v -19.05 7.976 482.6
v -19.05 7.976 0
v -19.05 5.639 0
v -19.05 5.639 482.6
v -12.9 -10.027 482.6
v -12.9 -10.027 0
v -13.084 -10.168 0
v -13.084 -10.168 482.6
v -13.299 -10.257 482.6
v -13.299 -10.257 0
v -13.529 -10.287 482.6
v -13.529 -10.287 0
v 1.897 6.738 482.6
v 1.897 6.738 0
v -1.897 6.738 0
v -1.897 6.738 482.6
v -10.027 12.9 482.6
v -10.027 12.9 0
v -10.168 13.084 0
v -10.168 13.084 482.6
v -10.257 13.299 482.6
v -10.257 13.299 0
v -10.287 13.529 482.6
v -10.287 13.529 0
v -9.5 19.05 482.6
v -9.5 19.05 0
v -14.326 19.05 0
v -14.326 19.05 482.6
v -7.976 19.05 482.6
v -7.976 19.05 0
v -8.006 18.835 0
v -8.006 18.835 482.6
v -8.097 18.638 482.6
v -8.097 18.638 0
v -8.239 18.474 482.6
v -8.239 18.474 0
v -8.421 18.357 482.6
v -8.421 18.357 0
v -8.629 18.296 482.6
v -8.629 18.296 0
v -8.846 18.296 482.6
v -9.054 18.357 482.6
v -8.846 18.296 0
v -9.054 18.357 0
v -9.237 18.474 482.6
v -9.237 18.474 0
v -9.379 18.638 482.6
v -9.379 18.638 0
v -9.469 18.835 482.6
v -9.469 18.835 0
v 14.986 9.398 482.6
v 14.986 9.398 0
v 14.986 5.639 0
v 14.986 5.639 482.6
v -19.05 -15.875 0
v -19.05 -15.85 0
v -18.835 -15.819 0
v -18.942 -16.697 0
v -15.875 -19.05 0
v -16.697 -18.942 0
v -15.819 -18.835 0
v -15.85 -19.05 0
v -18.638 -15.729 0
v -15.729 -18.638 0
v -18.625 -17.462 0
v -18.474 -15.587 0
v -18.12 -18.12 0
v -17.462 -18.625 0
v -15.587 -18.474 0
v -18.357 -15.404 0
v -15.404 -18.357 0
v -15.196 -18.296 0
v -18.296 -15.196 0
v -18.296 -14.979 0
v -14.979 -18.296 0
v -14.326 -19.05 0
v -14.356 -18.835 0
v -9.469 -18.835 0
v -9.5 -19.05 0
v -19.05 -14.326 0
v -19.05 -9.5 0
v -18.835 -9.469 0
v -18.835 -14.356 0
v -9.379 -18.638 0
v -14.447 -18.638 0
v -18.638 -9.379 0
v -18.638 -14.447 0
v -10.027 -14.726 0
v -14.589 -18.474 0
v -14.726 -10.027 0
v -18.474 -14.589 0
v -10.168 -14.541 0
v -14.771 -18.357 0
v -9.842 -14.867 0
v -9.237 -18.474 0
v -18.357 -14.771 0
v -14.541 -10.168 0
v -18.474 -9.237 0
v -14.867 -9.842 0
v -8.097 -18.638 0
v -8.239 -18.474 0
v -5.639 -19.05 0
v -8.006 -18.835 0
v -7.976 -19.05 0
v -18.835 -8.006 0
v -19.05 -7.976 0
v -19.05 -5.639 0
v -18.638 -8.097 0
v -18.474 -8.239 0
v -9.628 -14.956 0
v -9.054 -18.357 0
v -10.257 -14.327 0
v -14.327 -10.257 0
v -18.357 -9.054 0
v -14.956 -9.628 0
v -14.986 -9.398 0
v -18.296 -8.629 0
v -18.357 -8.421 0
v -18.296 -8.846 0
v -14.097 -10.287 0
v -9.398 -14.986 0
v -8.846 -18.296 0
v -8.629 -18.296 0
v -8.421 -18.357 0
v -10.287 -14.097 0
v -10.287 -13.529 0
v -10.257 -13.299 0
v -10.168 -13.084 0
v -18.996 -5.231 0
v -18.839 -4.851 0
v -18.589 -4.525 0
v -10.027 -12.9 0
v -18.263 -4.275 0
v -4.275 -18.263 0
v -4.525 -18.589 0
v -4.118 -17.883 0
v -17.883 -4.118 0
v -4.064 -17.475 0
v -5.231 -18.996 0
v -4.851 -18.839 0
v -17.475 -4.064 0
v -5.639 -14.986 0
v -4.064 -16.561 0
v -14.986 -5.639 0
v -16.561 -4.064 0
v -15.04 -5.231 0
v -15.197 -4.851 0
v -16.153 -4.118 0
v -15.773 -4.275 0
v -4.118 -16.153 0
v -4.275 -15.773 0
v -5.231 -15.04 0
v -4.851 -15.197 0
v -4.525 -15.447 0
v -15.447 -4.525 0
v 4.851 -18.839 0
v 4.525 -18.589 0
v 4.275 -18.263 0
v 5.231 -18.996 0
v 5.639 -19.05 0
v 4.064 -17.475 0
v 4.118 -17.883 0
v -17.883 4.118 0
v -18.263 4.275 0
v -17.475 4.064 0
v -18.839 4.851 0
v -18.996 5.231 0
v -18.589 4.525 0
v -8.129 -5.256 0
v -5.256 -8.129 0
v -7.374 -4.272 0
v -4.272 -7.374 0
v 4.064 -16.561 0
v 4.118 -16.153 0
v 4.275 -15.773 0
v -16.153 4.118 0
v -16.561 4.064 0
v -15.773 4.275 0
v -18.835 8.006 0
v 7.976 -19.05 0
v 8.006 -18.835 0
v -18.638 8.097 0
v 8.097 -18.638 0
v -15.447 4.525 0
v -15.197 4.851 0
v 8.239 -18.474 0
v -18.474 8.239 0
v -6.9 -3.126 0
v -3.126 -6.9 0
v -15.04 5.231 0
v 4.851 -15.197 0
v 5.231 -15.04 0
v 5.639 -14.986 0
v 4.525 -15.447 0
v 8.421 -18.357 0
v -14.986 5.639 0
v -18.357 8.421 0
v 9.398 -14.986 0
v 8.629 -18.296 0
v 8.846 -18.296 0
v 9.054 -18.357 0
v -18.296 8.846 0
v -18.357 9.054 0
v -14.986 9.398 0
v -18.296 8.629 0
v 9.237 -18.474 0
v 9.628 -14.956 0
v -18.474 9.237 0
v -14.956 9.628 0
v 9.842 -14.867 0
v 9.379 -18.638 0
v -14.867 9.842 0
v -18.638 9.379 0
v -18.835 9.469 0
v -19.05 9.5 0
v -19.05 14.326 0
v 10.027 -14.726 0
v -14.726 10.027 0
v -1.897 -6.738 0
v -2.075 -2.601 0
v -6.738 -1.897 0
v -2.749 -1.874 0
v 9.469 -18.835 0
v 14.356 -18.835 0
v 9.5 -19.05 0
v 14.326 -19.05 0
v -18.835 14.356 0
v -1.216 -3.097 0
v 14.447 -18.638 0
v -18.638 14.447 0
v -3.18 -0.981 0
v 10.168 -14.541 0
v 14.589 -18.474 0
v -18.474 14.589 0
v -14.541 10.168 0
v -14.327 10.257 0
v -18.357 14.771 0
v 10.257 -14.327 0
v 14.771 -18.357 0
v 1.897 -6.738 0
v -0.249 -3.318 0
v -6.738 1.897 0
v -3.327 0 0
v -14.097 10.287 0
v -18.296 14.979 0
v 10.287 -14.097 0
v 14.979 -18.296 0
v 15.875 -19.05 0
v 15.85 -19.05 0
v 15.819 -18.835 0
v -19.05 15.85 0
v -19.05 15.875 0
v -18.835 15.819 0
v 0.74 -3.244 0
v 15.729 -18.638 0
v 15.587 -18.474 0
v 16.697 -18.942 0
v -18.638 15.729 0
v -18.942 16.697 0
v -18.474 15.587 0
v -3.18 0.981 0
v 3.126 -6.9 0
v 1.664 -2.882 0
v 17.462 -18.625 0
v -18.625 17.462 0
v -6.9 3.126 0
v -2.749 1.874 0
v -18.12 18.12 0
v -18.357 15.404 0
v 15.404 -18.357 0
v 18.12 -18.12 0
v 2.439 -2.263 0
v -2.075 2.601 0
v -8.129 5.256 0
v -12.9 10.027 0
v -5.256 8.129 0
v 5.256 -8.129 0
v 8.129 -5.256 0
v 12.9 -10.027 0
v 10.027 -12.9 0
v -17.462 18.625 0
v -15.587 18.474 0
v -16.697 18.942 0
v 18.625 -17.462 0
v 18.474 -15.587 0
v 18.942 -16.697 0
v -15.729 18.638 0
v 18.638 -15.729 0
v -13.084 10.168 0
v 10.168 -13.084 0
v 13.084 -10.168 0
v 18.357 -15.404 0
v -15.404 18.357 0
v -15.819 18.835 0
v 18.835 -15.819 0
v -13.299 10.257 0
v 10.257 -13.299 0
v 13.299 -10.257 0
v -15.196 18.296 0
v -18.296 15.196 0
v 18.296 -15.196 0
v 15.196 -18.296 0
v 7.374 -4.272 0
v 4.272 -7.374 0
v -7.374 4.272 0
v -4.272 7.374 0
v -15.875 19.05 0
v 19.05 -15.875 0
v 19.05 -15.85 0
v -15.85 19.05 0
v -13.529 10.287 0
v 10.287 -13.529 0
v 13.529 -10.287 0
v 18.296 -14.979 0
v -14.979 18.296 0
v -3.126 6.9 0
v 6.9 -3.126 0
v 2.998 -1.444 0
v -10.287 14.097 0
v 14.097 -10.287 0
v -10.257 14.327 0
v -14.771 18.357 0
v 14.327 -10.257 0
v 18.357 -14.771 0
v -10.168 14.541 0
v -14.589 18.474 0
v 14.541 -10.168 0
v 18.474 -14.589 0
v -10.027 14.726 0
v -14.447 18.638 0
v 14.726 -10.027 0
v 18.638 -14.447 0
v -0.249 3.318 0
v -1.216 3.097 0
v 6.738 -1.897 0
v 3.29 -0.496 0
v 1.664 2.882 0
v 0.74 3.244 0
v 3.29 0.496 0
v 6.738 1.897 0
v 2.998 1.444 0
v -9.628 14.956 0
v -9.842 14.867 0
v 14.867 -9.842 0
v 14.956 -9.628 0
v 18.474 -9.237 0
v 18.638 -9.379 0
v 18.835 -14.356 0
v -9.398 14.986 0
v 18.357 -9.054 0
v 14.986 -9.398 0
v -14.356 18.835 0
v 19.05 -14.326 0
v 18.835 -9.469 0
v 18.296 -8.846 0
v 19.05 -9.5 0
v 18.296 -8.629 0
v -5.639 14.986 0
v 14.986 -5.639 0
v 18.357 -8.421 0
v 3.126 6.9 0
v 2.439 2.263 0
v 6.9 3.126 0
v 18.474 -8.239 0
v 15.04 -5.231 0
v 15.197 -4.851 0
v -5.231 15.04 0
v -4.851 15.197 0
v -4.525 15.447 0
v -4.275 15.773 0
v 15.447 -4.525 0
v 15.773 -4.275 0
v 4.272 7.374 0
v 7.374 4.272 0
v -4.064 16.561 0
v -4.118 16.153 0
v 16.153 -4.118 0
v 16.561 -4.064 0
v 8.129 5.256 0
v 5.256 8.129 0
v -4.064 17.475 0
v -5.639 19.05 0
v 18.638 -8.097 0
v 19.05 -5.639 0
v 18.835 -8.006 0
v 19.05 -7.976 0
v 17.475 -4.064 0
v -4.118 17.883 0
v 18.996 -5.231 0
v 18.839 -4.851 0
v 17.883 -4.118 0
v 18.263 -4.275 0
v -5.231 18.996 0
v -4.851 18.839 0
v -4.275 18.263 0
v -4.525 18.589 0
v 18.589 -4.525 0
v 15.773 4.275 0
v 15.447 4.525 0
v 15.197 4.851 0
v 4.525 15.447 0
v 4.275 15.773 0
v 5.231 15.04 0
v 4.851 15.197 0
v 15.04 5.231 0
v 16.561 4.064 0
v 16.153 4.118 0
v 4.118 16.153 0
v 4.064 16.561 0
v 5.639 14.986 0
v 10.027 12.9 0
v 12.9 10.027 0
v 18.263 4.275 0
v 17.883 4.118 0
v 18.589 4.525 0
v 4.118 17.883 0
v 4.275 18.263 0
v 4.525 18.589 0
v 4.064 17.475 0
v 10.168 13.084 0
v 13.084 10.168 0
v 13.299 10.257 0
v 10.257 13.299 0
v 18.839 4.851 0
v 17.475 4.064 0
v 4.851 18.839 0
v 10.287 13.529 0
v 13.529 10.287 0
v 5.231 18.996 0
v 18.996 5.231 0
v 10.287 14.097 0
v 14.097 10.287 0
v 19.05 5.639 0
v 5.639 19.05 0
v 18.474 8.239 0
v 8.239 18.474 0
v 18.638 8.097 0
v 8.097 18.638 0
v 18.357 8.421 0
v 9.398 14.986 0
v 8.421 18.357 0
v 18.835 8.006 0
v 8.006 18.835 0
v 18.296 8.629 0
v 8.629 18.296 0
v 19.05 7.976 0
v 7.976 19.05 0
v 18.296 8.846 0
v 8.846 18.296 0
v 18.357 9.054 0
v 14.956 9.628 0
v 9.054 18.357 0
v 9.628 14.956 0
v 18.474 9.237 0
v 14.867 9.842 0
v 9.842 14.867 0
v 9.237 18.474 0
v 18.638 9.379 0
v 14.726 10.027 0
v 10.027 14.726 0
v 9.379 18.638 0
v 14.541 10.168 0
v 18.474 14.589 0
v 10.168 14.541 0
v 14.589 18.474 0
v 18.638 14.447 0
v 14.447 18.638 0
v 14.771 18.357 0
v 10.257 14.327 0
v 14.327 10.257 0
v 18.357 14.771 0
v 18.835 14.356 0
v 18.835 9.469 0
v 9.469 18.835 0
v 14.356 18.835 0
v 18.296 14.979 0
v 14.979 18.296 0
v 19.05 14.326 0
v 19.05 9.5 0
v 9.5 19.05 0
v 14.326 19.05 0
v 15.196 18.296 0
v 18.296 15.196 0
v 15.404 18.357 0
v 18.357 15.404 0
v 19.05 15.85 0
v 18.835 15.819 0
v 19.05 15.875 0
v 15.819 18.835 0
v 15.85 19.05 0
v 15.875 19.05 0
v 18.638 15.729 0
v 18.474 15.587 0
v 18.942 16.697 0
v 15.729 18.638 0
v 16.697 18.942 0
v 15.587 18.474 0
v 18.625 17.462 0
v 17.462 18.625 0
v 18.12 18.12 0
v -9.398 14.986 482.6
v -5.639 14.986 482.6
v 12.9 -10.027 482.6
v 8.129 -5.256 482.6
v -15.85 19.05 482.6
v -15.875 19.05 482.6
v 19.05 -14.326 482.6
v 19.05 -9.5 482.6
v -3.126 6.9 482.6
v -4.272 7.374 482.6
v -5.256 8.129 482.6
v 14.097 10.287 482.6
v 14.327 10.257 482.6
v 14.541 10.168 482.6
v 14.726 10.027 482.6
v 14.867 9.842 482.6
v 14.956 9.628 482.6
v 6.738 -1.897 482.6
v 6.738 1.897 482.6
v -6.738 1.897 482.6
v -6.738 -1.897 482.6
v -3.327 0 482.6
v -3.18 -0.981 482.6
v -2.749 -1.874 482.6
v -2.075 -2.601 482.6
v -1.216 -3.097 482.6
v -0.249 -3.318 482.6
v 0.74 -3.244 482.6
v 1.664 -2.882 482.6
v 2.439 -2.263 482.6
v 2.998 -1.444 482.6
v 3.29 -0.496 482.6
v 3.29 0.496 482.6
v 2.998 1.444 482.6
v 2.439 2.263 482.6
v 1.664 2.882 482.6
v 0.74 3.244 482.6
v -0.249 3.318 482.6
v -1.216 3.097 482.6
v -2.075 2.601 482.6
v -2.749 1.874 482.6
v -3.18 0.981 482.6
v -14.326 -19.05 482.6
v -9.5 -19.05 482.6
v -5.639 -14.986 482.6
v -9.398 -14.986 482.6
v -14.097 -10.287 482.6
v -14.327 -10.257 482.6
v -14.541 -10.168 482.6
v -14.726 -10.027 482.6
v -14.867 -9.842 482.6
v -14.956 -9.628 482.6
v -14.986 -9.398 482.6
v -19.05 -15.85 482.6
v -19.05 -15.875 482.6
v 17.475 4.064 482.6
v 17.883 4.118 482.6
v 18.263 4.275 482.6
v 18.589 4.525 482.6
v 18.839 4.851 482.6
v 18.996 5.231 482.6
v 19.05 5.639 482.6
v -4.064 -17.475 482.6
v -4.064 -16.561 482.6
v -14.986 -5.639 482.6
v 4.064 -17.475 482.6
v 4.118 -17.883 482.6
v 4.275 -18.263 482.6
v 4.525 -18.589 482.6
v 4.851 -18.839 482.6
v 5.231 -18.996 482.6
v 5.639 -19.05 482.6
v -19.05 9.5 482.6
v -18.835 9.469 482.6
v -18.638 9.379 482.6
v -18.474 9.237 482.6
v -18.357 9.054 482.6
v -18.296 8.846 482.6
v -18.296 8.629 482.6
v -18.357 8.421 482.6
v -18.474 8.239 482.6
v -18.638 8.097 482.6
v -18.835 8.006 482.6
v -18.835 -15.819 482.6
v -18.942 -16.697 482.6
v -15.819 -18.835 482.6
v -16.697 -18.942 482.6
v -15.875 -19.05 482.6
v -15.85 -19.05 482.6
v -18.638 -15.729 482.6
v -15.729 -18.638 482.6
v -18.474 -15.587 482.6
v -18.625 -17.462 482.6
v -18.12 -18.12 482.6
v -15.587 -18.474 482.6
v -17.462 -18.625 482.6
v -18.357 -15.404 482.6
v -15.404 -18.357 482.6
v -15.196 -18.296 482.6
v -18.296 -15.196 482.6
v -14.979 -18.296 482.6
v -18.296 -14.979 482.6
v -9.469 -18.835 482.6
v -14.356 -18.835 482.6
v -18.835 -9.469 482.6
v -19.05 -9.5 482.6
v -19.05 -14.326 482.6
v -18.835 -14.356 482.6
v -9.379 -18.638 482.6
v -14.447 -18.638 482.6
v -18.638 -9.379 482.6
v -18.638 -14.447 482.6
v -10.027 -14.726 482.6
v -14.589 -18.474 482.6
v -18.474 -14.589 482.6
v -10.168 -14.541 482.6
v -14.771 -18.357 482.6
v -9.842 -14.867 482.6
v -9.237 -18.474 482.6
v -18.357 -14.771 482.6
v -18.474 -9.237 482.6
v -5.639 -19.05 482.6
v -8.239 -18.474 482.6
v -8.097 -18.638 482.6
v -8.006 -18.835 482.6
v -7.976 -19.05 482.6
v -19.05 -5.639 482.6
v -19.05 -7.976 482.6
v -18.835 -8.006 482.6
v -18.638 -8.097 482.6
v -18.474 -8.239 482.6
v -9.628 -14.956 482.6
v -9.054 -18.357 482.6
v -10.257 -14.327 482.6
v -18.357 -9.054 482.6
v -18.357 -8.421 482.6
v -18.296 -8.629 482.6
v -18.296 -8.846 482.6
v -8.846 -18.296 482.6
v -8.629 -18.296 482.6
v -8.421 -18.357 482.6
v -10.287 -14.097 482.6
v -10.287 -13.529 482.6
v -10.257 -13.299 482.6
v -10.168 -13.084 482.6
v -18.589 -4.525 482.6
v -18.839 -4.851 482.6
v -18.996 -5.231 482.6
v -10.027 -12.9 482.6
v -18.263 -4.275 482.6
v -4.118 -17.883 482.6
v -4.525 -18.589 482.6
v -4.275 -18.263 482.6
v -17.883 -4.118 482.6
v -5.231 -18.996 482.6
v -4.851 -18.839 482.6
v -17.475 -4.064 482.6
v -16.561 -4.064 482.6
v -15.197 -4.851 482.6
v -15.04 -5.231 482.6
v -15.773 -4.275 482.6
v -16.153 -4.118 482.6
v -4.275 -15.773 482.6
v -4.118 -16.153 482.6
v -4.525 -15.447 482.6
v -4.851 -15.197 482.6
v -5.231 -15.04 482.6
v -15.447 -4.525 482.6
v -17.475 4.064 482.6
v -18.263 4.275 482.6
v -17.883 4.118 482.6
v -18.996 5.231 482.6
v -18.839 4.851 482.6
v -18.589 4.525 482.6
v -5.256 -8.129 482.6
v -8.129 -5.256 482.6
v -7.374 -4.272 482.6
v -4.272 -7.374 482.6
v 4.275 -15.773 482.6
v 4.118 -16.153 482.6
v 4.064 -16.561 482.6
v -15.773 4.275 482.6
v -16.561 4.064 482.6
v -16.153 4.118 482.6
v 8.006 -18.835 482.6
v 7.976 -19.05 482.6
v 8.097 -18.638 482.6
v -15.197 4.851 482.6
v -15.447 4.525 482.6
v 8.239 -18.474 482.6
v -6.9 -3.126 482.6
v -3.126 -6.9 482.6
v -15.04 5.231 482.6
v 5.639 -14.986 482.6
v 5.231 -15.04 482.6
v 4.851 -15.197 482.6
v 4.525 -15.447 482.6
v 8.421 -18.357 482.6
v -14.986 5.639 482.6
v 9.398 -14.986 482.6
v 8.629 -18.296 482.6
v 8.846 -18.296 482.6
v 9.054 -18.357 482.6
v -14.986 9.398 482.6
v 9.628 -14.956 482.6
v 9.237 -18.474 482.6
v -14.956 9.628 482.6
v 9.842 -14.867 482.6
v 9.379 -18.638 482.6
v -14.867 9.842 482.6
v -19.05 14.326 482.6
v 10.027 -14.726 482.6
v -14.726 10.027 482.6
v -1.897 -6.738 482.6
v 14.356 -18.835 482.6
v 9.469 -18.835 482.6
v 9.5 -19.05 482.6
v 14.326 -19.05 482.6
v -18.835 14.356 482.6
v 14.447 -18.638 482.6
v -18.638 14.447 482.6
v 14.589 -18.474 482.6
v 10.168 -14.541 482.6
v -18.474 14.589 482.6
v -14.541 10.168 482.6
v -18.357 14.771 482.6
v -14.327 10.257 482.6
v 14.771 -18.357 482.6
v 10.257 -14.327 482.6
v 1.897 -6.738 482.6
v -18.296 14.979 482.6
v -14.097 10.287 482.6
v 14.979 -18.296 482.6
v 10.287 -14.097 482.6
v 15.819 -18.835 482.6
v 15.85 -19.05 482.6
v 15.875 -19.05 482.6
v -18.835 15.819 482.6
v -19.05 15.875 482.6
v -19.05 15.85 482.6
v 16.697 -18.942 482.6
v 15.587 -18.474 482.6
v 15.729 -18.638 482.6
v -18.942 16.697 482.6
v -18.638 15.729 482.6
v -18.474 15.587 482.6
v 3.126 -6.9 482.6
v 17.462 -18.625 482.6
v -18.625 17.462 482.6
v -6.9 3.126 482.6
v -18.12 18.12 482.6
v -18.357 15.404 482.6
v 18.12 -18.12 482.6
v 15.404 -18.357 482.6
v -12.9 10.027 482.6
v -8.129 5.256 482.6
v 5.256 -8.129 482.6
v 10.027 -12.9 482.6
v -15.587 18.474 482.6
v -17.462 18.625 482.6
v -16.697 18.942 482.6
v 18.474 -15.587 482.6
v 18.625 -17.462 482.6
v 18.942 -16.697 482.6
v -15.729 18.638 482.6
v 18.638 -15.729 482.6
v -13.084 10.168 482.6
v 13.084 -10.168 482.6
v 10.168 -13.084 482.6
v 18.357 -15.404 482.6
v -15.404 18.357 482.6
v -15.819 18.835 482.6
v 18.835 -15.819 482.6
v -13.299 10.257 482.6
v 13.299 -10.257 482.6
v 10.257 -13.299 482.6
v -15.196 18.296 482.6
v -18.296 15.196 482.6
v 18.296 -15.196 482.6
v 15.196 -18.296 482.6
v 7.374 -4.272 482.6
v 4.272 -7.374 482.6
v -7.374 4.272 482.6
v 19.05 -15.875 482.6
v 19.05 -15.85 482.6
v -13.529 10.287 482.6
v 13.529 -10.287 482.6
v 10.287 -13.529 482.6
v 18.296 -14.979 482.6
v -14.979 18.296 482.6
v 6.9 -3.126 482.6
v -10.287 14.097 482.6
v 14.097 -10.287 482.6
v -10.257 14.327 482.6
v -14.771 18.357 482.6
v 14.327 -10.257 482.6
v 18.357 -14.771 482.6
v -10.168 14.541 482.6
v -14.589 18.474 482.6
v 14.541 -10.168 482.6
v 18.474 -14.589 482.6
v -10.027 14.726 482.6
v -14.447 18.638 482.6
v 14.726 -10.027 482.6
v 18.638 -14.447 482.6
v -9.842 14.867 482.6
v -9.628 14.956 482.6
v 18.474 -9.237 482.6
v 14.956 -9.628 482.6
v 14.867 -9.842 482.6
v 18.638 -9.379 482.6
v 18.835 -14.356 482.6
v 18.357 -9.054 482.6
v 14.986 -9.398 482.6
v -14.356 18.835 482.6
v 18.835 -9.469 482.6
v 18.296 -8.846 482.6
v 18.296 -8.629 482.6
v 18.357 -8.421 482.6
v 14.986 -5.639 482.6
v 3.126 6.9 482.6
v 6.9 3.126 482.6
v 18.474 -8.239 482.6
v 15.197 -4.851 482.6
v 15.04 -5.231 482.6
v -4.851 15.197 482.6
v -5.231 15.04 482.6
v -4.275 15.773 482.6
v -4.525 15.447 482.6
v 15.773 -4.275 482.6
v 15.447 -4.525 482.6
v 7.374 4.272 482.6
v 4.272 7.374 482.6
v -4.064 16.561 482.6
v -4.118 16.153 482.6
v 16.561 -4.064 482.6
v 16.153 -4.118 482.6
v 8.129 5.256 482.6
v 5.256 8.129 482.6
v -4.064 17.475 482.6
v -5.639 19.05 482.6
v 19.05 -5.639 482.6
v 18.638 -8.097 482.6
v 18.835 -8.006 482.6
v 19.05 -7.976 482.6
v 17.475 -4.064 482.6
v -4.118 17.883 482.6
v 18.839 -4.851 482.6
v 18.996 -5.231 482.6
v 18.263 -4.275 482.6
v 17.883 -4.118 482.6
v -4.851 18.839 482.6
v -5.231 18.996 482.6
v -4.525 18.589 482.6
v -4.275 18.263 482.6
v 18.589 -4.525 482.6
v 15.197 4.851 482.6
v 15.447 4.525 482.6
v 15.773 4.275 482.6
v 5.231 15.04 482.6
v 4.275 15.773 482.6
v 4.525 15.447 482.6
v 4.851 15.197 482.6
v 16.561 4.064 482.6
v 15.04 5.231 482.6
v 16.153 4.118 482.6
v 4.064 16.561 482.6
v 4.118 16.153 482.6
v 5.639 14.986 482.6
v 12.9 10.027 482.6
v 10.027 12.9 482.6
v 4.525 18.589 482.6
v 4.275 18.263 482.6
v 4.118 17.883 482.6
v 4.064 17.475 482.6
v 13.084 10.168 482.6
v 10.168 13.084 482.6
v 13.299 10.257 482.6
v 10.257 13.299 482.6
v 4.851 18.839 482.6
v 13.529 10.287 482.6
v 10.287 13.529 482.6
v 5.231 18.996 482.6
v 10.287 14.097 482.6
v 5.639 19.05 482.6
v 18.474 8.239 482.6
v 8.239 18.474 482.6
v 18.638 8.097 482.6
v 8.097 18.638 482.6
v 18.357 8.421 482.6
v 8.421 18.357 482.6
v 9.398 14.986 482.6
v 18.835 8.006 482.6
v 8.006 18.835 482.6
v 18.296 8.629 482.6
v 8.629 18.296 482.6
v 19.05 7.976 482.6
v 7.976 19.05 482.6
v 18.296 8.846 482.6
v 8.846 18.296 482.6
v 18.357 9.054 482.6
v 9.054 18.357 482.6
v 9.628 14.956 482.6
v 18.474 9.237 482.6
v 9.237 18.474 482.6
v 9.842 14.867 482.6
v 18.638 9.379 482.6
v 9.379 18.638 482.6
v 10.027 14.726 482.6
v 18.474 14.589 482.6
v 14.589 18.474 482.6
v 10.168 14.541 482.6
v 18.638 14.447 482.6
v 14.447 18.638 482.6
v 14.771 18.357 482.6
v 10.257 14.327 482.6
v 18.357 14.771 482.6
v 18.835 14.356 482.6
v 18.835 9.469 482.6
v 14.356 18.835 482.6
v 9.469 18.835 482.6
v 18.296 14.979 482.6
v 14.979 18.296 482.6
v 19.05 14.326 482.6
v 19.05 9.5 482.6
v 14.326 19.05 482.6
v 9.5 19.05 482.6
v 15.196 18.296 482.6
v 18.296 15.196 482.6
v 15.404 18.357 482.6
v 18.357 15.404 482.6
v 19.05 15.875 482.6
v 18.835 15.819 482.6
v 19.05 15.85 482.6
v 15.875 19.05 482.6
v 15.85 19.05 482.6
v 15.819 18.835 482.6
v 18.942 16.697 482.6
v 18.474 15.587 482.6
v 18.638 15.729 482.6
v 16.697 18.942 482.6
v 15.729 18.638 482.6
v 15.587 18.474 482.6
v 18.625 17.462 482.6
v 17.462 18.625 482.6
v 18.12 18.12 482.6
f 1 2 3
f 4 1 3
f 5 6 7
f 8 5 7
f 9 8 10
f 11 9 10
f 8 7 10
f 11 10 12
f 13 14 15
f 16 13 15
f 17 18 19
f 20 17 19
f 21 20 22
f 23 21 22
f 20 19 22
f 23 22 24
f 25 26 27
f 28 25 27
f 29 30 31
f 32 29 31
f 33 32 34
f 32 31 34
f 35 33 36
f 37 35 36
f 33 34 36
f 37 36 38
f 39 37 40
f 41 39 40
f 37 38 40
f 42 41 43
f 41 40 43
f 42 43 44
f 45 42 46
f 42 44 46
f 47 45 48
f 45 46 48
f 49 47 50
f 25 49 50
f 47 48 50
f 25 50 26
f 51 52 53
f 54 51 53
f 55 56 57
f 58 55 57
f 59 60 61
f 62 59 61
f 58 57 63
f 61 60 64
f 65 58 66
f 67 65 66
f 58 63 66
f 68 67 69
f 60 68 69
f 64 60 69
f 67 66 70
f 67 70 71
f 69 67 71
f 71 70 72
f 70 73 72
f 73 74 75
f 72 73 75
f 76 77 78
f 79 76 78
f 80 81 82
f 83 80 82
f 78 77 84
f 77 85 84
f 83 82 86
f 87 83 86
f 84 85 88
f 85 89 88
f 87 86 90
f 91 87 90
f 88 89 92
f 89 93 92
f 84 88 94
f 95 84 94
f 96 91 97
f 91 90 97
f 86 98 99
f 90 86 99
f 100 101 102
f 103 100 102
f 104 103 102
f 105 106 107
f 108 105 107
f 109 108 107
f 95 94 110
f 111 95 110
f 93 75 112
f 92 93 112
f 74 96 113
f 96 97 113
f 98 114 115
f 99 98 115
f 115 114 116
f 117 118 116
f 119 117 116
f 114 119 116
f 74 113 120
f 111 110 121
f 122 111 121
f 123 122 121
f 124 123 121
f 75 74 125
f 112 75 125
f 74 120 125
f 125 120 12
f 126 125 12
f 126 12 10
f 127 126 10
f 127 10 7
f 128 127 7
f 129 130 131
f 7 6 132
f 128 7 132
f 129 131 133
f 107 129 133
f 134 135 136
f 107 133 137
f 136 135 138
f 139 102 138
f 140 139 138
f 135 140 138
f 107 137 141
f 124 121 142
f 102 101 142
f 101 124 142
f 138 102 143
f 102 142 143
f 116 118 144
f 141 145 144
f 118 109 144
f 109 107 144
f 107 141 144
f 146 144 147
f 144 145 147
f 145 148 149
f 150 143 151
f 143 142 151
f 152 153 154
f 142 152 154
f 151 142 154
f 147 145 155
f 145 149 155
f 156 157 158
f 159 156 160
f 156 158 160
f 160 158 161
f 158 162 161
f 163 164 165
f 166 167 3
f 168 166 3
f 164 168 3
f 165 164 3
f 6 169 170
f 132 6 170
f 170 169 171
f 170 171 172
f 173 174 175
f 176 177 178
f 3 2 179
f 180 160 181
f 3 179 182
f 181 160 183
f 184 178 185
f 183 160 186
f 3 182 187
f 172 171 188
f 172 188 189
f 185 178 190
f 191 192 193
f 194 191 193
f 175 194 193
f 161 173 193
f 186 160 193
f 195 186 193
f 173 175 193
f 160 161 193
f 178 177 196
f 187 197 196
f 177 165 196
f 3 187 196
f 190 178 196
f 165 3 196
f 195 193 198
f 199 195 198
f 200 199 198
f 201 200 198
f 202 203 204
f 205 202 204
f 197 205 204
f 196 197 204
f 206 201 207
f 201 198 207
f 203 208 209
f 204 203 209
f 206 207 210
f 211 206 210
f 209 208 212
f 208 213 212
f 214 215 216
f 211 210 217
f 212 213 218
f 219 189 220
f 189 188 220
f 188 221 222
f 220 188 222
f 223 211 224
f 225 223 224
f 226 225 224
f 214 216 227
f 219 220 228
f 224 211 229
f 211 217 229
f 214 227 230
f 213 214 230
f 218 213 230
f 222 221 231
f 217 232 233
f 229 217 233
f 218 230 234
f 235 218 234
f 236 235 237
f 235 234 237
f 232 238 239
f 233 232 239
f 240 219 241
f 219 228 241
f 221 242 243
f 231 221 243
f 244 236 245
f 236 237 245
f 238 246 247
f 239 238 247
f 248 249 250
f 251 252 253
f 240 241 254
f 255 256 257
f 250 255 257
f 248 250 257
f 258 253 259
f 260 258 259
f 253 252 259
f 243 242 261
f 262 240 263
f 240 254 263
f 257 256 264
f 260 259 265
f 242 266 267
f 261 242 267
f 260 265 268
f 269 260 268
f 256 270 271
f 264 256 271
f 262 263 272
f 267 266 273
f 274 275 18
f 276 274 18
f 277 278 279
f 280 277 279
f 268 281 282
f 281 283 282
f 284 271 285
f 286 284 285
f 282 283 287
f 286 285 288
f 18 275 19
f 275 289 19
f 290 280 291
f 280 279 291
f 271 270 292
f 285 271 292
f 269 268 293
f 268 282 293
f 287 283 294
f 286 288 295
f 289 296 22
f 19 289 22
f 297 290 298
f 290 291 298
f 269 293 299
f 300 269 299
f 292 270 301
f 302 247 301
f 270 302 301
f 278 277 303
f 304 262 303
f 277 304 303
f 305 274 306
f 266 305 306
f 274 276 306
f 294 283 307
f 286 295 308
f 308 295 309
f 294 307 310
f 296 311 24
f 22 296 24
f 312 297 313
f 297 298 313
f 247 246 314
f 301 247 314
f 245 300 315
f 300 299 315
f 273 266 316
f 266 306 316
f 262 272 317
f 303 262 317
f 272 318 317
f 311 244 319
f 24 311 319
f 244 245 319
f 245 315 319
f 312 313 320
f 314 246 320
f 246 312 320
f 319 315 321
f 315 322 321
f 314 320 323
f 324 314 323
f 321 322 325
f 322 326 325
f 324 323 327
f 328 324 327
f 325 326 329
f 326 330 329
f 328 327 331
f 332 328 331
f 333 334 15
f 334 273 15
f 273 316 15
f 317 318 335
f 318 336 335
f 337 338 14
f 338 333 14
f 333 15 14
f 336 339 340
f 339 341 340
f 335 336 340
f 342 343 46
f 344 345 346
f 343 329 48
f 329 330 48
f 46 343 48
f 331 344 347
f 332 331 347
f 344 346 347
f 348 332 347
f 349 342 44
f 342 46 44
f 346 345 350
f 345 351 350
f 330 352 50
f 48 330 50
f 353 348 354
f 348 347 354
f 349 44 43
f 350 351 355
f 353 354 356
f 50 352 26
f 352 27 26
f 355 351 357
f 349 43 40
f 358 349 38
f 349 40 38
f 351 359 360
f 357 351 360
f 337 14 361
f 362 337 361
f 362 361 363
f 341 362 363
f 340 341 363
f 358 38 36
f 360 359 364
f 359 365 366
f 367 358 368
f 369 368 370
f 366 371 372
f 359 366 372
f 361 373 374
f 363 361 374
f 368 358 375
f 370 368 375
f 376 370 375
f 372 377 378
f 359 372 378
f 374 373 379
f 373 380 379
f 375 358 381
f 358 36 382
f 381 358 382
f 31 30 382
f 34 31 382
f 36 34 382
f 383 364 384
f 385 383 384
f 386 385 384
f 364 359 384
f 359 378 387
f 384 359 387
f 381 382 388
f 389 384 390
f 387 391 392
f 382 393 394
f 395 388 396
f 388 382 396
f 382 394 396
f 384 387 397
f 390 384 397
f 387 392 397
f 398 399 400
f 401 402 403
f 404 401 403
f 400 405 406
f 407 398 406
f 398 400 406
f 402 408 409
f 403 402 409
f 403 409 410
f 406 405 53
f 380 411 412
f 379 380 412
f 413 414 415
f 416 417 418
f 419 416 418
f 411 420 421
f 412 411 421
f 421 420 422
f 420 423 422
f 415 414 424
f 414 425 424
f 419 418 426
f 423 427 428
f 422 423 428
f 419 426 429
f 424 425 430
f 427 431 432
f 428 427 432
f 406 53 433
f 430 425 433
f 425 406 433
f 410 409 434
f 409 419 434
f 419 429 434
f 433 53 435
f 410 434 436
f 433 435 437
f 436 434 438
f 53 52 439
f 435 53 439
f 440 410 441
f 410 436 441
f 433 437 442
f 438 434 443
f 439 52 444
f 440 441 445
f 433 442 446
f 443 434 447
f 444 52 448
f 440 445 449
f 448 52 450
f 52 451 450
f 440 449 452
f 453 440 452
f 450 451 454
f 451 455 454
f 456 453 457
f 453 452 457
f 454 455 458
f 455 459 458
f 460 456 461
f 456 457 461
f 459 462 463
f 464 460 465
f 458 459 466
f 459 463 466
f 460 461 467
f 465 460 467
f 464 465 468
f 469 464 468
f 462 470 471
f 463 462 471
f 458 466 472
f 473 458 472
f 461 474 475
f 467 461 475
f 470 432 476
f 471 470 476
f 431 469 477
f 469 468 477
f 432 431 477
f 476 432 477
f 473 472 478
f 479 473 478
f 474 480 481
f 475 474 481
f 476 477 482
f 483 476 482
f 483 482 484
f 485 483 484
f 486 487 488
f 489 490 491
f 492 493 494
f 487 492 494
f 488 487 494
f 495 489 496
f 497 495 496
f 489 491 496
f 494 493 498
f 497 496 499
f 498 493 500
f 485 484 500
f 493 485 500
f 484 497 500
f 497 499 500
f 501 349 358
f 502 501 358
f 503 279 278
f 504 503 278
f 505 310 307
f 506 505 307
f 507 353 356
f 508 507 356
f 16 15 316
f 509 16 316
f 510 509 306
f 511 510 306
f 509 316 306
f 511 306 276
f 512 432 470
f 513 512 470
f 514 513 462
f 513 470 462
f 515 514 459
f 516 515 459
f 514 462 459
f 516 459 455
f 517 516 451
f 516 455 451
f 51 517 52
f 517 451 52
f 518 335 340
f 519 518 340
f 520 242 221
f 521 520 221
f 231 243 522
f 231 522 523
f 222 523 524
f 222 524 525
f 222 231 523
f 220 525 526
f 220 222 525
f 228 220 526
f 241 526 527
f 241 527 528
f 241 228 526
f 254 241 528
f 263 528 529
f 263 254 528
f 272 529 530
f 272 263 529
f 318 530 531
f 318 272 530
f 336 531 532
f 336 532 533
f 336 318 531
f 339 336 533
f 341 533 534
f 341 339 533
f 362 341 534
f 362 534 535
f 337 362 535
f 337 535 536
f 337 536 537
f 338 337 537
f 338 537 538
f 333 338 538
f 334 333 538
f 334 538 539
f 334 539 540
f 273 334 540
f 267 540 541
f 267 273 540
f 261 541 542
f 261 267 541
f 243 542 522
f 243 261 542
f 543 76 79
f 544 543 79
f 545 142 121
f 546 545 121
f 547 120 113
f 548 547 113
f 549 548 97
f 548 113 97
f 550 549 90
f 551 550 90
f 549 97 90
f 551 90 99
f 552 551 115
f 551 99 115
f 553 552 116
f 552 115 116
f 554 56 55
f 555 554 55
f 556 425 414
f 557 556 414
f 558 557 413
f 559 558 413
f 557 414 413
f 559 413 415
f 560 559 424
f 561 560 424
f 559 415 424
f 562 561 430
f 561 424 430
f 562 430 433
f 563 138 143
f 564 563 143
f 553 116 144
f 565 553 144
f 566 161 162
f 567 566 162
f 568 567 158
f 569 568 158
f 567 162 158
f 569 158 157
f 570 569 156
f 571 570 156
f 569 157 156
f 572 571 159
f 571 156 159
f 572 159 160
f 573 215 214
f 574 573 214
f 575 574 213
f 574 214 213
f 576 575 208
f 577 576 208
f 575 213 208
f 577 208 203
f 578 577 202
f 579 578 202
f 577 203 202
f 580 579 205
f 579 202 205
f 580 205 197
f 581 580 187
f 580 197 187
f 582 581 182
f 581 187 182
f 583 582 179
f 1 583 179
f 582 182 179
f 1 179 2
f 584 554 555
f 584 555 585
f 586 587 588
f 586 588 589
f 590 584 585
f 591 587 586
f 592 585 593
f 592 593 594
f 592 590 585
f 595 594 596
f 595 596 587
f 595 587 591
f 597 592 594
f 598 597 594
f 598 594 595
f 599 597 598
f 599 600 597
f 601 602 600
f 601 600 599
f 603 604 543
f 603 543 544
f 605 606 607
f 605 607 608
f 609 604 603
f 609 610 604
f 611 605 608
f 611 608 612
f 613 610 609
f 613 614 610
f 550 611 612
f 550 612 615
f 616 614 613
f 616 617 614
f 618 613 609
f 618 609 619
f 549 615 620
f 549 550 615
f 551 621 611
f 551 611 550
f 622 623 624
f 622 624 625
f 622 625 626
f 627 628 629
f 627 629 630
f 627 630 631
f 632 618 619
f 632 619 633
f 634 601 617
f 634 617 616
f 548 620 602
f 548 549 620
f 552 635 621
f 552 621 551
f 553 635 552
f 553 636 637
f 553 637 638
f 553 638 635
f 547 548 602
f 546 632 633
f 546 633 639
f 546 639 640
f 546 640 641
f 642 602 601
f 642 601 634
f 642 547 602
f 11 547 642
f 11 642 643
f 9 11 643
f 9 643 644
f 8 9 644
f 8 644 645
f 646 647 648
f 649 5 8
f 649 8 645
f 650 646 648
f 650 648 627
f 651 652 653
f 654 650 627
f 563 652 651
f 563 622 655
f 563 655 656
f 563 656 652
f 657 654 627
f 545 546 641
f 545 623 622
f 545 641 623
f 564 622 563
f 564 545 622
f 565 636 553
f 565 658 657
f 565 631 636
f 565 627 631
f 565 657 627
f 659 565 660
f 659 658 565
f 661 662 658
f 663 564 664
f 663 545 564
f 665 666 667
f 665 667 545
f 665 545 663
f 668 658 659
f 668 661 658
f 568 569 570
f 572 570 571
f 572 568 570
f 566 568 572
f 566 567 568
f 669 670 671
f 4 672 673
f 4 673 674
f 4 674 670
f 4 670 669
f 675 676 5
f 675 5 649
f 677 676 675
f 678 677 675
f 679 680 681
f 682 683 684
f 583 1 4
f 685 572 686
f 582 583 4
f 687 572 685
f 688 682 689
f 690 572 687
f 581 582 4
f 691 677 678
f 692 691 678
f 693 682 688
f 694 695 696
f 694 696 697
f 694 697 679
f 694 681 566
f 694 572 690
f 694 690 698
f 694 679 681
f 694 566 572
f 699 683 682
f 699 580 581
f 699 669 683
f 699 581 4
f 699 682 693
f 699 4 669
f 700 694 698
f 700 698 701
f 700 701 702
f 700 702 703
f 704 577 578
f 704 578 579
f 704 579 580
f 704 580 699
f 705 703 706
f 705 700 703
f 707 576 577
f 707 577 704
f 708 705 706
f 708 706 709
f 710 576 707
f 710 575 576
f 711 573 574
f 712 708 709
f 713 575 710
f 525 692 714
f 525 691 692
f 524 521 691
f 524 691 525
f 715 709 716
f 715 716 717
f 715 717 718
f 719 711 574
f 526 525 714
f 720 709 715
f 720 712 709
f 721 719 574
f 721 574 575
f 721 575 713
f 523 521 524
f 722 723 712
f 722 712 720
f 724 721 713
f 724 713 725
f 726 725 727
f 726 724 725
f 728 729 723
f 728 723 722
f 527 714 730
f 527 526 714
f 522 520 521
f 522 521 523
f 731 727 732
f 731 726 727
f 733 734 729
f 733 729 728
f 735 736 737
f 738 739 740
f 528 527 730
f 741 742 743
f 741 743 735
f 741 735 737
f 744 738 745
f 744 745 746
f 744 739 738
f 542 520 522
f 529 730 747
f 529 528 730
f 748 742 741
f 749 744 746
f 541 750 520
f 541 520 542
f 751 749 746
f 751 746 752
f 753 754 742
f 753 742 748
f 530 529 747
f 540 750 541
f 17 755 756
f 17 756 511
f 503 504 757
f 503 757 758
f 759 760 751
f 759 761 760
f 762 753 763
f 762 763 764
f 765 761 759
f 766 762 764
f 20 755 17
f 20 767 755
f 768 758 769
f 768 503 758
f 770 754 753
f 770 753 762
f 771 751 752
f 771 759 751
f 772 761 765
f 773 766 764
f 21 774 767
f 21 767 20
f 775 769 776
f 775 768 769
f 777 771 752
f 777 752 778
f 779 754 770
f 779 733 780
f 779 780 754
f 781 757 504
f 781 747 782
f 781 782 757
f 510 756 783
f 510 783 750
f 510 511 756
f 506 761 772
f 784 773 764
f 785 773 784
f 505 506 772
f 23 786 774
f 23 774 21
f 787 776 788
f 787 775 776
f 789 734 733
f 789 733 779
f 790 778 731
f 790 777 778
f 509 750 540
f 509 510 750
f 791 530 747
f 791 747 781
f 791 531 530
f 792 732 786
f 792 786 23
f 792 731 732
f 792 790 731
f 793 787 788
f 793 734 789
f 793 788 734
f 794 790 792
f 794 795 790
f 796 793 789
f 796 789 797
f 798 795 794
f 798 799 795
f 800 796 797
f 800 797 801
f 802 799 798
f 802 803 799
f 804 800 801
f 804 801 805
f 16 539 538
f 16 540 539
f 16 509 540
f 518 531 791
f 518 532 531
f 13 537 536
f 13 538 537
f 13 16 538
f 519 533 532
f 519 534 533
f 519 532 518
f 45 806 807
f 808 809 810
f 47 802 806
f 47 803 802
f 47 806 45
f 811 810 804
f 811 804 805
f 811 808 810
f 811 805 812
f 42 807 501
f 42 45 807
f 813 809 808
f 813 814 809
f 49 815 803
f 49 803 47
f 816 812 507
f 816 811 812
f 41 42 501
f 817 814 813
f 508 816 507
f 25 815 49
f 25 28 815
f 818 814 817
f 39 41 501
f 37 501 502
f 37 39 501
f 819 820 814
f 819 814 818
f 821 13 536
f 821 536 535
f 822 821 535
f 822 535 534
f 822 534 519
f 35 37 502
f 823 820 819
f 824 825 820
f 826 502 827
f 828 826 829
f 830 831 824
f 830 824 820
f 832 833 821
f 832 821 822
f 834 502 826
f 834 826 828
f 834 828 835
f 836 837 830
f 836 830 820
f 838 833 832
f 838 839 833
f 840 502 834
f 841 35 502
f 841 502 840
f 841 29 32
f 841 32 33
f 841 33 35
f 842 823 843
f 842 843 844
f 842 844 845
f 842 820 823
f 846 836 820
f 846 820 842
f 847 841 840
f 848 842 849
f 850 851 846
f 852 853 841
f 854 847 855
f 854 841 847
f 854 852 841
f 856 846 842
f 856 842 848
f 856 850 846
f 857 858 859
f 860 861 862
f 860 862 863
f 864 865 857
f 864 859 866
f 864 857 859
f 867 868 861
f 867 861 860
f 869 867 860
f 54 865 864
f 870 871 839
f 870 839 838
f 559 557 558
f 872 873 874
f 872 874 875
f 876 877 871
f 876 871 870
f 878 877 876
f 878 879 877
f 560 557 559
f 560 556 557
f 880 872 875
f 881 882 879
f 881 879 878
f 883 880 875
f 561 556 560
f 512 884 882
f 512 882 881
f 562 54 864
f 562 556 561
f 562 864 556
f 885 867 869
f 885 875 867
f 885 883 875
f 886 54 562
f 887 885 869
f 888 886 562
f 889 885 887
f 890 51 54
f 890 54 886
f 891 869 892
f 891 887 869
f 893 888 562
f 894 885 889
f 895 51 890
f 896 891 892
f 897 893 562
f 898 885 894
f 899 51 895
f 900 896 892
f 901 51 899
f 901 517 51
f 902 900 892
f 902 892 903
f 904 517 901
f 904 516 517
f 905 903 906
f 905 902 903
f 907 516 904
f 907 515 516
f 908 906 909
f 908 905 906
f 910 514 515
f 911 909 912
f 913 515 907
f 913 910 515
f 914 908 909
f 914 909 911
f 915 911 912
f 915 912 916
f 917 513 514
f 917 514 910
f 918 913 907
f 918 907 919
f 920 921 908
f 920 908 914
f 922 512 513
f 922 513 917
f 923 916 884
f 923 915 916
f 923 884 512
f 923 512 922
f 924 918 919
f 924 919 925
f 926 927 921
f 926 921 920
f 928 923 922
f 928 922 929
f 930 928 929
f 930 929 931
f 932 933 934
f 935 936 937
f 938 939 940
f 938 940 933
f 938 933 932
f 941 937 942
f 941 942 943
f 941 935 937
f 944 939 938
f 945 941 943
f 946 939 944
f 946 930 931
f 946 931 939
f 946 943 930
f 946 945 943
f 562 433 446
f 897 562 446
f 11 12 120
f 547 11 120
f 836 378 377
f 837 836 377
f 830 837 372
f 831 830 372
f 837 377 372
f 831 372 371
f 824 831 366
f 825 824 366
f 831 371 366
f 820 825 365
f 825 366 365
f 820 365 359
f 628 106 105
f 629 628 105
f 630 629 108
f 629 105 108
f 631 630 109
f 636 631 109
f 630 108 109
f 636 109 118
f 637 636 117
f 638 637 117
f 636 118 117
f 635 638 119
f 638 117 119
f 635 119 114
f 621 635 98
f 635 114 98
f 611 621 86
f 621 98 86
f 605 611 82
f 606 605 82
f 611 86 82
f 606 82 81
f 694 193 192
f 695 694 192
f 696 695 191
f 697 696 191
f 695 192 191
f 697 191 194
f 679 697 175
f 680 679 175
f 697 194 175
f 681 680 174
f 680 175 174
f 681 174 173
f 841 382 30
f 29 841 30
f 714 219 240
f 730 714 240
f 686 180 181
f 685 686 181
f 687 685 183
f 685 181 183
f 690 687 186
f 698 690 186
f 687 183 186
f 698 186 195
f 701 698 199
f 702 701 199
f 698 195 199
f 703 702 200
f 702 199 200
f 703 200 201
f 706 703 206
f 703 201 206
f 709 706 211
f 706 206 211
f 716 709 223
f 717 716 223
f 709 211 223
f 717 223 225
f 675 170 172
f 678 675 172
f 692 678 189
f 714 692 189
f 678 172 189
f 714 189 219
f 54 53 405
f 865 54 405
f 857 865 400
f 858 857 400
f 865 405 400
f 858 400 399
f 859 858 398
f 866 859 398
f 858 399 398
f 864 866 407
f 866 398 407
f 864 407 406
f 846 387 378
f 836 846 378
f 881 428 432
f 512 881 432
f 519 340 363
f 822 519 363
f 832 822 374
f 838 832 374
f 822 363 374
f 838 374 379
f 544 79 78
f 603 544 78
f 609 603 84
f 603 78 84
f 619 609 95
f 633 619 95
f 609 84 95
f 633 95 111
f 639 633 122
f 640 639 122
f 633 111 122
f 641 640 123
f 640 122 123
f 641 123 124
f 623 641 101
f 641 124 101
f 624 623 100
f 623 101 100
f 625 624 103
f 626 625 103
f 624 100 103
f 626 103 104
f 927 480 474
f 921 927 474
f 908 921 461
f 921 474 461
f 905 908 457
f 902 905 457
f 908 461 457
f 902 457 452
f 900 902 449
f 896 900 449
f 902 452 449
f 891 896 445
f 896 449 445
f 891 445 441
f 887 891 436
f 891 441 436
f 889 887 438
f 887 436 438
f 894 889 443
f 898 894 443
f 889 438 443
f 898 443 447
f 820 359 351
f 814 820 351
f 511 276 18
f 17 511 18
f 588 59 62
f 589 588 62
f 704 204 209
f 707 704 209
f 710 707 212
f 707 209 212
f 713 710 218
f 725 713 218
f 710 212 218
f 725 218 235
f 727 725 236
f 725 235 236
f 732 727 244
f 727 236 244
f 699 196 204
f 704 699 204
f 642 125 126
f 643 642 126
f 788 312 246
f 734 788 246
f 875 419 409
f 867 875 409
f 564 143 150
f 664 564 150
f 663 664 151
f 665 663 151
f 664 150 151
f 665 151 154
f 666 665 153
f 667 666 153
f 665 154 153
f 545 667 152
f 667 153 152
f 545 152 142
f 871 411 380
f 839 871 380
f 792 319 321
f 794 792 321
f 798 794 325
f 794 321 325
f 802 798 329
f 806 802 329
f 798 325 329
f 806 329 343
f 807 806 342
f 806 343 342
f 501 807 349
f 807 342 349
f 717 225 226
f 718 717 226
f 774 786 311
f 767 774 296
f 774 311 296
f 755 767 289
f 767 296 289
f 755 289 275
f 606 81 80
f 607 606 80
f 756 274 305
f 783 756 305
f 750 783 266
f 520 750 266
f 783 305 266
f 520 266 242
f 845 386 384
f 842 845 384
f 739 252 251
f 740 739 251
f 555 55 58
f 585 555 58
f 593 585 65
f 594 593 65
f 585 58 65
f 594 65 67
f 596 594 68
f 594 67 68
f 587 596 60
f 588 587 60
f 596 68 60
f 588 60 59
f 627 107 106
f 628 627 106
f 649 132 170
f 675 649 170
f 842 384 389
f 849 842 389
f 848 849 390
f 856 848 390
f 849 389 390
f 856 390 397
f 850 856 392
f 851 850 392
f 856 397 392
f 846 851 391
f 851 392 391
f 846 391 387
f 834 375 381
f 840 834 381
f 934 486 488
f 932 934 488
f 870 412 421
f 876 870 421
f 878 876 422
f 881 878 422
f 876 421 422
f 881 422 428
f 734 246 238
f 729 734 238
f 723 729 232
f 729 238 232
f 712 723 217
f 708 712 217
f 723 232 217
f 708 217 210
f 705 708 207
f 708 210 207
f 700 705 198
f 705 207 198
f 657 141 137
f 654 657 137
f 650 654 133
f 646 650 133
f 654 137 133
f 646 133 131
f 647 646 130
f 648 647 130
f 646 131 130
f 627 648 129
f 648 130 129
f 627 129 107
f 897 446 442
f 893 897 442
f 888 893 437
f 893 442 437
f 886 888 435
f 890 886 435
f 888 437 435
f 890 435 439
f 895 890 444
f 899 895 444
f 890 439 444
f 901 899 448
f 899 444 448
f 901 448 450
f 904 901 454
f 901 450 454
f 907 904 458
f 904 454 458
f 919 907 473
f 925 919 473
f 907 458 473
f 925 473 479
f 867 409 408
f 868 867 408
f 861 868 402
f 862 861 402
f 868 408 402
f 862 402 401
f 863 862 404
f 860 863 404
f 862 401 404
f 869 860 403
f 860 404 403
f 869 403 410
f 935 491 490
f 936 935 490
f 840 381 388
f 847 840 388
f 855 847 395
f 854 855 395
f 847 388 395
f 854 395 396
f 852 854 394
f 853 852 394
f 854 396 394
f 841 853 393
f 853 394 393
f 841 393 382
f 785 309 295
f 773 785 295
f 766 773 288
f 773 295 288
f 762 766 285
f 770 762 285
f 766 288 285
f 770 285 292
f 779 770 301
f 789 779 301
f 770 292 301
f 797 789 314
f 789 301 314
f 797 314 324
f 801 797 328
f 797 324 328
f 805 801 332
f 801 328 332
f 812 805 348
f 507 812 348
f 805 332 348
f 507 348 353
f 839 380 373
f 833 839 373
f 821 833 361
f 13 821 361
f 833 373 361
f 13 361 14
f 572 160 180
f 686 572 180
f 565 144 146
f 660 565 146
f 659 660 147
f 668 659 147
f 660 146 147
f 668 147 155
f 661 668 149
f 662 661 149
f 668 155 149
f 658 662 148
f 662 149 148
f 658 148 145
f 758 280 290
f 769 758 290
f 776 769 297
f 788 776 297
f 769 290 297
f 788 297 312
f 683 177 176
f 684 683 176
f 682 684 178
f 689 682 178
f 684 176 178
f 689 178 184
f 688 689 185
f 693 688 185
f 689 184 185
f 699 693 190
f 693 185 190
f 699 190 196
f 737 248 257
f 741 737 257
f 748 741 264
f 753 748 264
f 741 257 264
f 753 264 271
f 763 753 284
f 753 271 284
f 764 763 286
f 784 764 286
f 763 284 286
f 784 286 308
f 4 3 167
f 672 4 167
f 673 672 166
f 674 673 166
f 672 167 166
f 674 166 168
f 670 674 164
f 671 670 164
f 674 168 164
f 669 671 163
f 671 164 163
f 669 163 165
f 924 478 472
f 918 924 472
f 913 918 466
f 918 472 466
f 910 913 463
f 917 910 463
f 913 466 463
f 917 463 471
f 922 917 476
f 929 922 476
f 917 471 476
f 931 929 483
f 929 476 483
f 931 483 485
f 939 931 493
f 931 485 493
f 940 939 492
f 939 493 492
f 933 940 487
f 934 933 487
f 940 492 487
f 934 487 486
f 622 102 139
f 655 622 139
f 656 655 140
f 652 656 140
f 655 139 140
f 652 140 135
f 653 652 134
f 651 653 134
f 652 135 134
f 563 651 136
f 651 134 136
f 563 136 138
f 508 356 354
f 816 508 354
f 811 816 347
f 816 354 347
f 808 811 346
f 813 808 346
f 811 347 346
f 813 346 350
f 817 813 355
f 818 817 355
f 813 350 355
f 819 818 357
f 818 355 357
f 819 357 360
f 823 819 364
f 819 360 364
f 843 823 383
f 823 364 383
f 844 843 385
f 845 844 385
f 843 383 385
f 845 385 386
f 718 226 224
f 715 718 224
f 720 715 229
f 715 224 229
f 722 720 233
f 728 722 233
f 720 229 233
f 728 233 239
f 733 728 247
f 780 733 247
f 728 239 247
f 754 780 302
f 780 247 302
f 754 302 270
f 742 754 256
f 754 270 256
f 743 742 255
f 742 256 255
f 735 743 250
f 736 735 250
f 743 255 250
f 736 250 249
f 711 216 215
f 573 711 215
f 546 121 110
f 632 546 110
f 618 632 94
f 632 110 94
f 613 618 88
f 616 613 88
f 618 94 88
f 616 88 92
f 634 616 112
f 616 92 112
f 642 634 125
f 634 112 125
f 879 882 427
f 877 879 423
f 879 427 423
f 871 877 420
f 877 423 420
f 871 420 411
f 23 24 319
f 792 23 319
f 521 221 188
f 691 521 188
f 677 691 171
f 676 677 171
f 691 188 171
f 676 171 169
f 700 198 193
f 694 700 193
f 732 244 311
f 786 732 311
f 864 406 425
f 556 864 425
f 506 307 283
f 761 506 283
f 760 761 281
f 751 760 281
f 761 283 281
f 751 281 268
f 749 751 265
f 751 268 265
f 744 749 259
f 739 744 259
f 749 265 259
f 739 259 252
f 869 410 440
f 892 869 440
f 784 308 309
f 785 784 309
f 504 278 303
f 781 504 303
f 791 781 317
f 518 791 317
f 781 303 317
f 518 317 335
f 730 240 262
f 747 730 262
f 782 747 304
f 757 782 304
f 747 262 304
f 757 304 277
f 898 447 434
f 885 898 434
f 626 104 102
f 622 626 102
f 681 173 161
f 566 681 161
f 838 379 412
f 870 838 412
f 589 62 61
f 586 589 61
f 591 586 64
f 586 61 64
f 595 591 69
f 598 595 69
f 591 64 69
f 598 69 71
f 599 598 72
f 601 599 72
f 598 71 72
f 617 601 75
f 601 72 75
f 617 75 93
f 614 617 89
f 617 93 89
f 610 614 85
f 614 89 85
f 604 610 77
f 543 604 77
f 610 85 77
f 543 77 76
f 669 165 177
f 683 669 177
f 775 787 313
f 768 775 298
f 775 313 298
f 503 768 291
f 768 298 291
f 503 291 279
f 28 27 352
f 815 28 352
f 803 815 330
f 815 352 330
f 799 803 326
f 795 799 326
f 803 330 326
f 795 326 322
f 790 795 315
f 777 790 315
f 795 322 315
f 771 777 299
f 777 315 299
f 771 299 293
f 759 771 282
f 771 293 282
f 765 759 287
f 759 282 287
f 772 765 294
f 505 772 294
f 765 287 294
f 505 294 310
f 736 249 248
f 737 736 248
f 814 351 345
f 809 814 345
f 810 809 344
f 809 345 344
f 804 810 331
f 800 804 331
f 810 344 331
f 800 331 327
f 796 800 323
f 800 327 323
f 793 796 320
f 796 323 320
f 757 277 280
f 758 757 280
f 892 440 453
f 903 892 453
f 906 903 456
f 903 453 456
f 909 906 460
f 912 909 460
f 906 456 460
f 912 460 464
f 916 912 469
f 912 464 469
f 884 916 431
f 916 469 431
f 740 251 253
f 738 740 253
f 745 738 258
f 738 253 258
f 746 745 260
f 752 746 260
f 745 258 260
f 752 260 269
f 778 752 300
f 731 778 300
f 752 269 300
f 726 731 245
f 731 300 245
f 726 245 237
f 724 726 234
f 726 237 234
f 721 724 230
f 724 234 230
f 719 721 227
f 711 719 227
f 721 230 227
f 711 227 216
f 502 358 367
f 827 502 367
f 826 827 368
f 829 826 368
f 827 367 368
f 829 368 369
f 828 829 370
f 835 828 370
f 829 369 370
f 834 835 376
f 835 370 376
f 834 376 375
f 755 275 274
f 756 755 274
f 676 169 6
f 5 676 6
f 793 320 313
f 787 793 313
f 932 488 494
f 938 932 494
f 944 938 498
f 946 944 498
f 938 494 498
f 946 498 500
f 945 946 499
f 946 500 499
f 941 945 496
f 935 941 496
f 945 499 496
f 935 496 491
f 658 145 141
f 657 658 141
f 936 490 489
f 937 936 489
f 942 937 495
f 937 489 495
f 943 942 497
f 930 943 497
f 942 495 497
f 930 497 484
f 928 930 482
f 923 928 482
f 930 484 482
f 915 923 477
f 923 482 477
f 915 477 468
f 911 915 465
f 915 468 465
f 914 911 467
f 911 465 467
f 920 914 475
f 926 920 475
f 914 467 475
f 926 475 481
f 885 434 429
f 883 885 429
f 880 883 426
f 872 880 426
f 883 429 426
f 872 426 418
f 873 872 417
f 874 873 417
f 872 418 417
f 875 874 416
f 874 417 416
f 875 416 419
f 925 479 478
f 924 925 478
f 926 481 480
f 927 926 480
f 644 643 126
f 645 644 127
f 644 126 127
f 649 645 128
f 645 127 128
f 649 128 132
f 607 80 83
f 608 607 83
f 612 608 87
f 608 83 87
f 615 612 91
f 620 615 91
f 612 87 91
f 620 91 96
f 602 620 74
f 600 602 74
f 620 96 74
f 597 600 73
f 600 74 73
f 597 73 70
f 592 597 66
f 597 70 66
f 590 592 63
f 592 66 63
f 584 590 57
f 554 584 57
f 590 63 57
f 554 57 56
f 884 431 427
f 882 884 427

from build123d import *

# Parameters (mm, degrees)
SKETCH1_R           = 3.3274
BOSS_EXTRUDE1_DEPTH = 482.6


with BuildPart() as part:
    # Sketch1 → Boss-Extrude1 (new body)
    with BuildSketch(Plane.XY):
        with BuildLine():
            Line((-14.097, 10.287), (-13.528918, 10.287))
            ThreePointArc((-13.528918, 10.287), (-13.188712428, 10.219328904), (-12.900300071, 10.026617928))
            Line((-12.900300071, 10.026617928), (-8.129198975, 5.255516832))
            ThreePointArc((-8.129198975, 5.255516832), (-7.09957176, 3.71457081), (-6.738014764, 1.896901043))
            Line((-6.738014764, 1.896901043), (-6.738014764, -1.896901043))
            ThreePointArc((-6.738014764, -1.896901043), (-7.09957176, -3.71457081), (-8.129198975, -5.255516832))
            Line((-8.129198975, -5.255516832), (-12.900300071, -10.026617928))
            ThreePointArc((-12.900300071, -10.026617928), (-13.188712428, -10.219328904), (-13.528918, -10.287))
            Line((-13.528918, -10.287), (-14.097, -10.287))
            ThreePointArc((-14.097, -10.287), (-14.725617928, -10.026617928), (-14.986, -9.398))
            Line((-14.986, -9.398), (-14.986, -5.6388))
            ThreePointArc((-14.986, -5.6388), (-15.447248241, -4.525248241), (-16.5608, -4.064))
            Line((-16.5608, -4.064), (-17.4752, -4.064))
            ThreePointArc((-17.4752, -4.064), (-18.588751759, -4.525248241), (-19.05, -5.6388))
            Line((-19.05, -5.6388), (-19.05, -7.9756))
            ThreePointArc((-19.05, -7.9756), (-18.288, -8.7376), (-19.05, -9.4996))
            Line((-19.05, -9.4996), (-19.05, -14.3256))
            ThreePointArc((-19.05, -14.3256), (-18.288, -15.0876), (-19.05, -15.8496))
            Line((-19.05, -15.8496), (-19.05, -15.875))
            ThreePointArc((-19.05, -15.875), (-18.12006403, -18.12006403), (-15.875, -19.05))
            Line((-15.875, -19.05), (-15.8496, -19.05))
            ThreePointArc((-15.8496, -19.05), (-15.0876, -18.288), (-14.3256, -19.05))
            Line((-14.3256, -19.05), (-9.4996, -19.05))
            ThreePointArc((-9.4996, -19.05), (-8.7376, -18.288), (-7.9756, -19.05))
            Line((-7.9756, -19.05), (-5.6388, -19.05))
            ThreePointArc((-5.6388, -19.05), (-4.525248241, -18.588751759), (-4.064, -17.4752))
            Line((-4.064, -17.4752), (-4.064, -16.5608))
            ThreePointArc((-4.064, -16.5608), (-4.525248241, -15.447248241), (-5.6388, -14.986))
            Line((-5.6388, -14.986), (-9.398, -14.986))
            ThreePointArc((-9.398, -14.986), (-10.026617928, -14.725617928), (-10.287, -14.097))
            Line((-10.287, -14.097), (-10.287, -13.528918))
            ThreePointArc((-10.287, -13.528918), (-10.219328904, -13.188712428), (-10.026617928, -12.900300071))
            Line((-10.026617928, -12.900300071), (-5.255516832, -8.129198975))
            ThreePointArc((-5.255516832, -8.129198975), (-3.71457081, -7.09957176), (-1.896901043, -6.738014764))
            Line((-1.896901043, -6.738014764), (1.896901043, -6.738014764))
            ThreePointArc((1.896901043, -6.738014764), (3.71457081, -7.09957176), (5.255516832, -8.129198975))
            Line((5.255516832, -8.129198975), (10.026617928, -12.900300071))
            ThreePointArc((10.026617928, -12.900300071), (10.219328904, -13.188712428), (10.287, -13.528918))
            Line((10.287, -13.528918), (10.287, -14.097))
            ThreePointArc((10.287, -14.097), (10.026617928, -14.725617928), (9.398, -14.986))
            Line((9.398, -14.986), (5.6388, -14.986))
            ThreePointArc((5.6388, -14.986), (4.525248241, -15.447248241), (4.064, -16.5608))
            Line((4.064, -16.5608), (4.064, -17.4752))
            ThreePointArc((4.064, -17.4752), (4.525248241, -18.588751759), (5.6388, -19.05))
            Line((5.6388, -19.05), (7.9756, -19.05))
            ThreePointArc((7.9756, -19.05), (8.7376, -18.288), (9.4996, -19.05))
            Line((9.4996, -19.05), (14.3256, -19.05))
            ThreePointArc((14.3256, -19.05), (15.0876, -18.288), (15.8496, -19.05))
            Line((15.8496, -19.05), (15.875, -19.05))
            ThreePointArc((15.875, -19.05), (18.12006403, -18.12006403), (19.05, -15.875))
            Line((19.05, -15.875), (19.05, -15.8496))
            ThreePointArc((19.05, -15.8496), (18.288, -15.0876), (19.05, -14.3256))
            Line((19.05, -14.3256), (19.05, -9.4996))
            ThreePointArc((19.05, -9.4996), (18.288, -8.7376), (19.05, -7.9756))
            Line((19.05, -7.9756), (19.05, -5.6388))
            ThreePointArc((19.05, -5.6388), (18.588751759, -4.525248241), (17.4752, -4.064))
            Line((17.4752, -4.064), (16.5608, -4.064))
            ThreePointArc((16.5608, -4.064), (15.447248241, -4.525248241), (14.986, -5.6388))
            Line((14.986, -5.6388), (14.986, -9.398))
            ThreePointArc((14.986, -9.398), (14.725617928, -10.026617928), (14.097, -10.287))
            Line((14.097, -10.287), (13.528918, -10.287))
            ThreePointArc((13.528918, -10.287), (13.188712428, -10.219328904), (12.900300071, -10.026617928))
            Line((12.900300071, -10.026617928), (8.129198975, -5.255516832))
            ThreePointArc((8.129198975, -5.255516832), (7.09957176, -3.71457081), (6.738014764, -1.896901043))
            Line((6.738014764, -1.896901043), (6.738014764, 1.896901043))
            ThreePointArc((6.738014764, 1.896901043), (7.09957176, 3.71457081), (8.129198975, 5.255516832))
            Line((8.129198975, 5.255516832), (12.900300071, 10.026617928))
            ThreePointArc((12.900300071, 10.026617928), (13.188712428, 10.219328904), (13.528918, 10.287))
            Line((13.528918, 10.287), (14.097, 10.287))
            ThreePointArc((14.097, 10.287), (14.725617928, 10.026617928), (14.986, 9.398))
            Line((14.986, 9.398), (14.986, 5.6388))
            ThreePointArc((14.986, 5.6388), (15.447248241, 4.525248241), (16.5608, 4.064))
            Line((16.5608, 4.064), (17.4752, 4.064))
            ThreePointArc((17.4752, 4.064), (18.588751759, 4.525248241), (19.05, 5.6388))
            Line((19.05, 5.6388), (19.05, 7.9756))
            ThreePointArc((19.05, 7.9756), (18.288, 8.7376), (19.05, 9.4996))
            Line((19.05, 9.4996), (19.05, 14.3256))
            ThreePointArc((19.05, 14.3256), (18.288, 15.0876), (19.05, 15.8496))
            Line((19.05, 15.8496), (19.05, 15.875))
            ThreePointArc((19.05, 15.875), (18.12006403, 18.12006403), (15.875, 19.05))
            Line((15.875, 19.05), (15.8496, 19.05))
            ThreePointArc((15.8496, 19.05), (15.0876, 18.288), (14.3256, 19.05))
            Line((14.3256, 19.05), (9.4996, 19.05))
            ThreePointArc((9.4996, 19.05), (8.7376, 18.288), (7.9756, 19.05))
            Line((7.9756, 19.05), (5.6388, 19.05))
            ThreePointArc((5.6388, 19.05), (4.525248241, 18.588751759), (4.064, 17.4752))
            Line((4.064, 17.4752), (4.064, 16.5608))
            ThreePointArc((4.064, 16.5608), (4.525248241, 15.447248241), (5.6388, 14.986))
            Line((5.6388, 14.986), (9.398, 14.986))
            ThreePointArc((9.398, 14.986), (10.026617928, 14.725617928), (10.287, 14.097))
            Line((10.287, 14.097), (10.287, 13.528918))
            ThreePointArc((10.287, 13.528918), (10.219328904, 13.188712428), (10.026617928, 12.900300071))
            Line((10.026617928, 12.900300071), (5.255516832, 8.129198975))
            ThreePointArc((5.255516832, 8.129198975), (3.71457081, 7.09957176), (1.896901043, 6.738014764))
            Line((1.896901043, 6.738014764), (-1.896901043, 6.738014764))
            ThreePointArc((-1.896901043, 6.738014764), (-3.71457081, 7.09957176), (-5.255516832, 8.129198975))
            Line((-5.255516832, 8.129198975), (-10.026617928, 12.900300071))
            ThreePointArc((-10.026617928, 12.900300071), (-10.219328904, 13.188712428), (-10.287, 13.528918))
            Line((-10.287, 13.528918), (-10.287, 14.097))
            ThreePointArc((-10.287, 14.097), (-10.026617928, 14.725617928), (-9.398, 14.986))
            Line((-9.398, 14.986), (-5.6388, 14.986))
            ThreePointArc((-5.6388, 14.986), (-4.525248241, 15.447248241), (-4.064, 16.5608))
            Line((-4.064, 16.5608), (-4.064, 17.4752))
            ThreePointArc((-4.064, 17.4752), (-4.525248241, 18.588751759), (-5.6388, 19.05))
            Line((-5.6388, 19.05), (-7.9756, 19.05))
            ThreePointArc((-7.9756, 19.05), (-8.7376, 18.288), (-9.4996, 19.05))
            Line((-9.4996, 19.05), (-14.3256, 19.05))
            ThreePointArc((-14.3256, 19.05), (-15.0876, 18.288), (-15.8496, 19.05))
            Line((-15.8496, 19.05), (-15.875, 19.05))
            ThreePointArc((-15.875, 19.05), (-18.12006403, 18.12006403), (-19.05, 15.875))
            Line((-19.05, 15.875), (-19.05, 15.8496))
            ThreePointArc((-19.05, 15.8496), (-18.288, 15.0876), (-19.05, 14.3256))
            Line((-19.05, 14.3256), (-19.05, 9.4996))
            ThreePointArc((-19.05, 9.4996), (-18.288, 8.7376), (-19.05, 7.9756))
            Line((-19.05, 7.9756), (-19.05, 5.6388))
            ThreePointArc((-19.05, 5.6388), (-18.588751759, 4.525248241), (-17.4752, 4.064))
            Line((-17.4752, 4.064), (-16.5608, 4.064))
            ThreePointArc((-16.5608, 4.064), (-15.447248241, 4.525248241), (-14.986, 5.6388))
            Line((-14.986, 5.6388), (-14.986, 9.398))
            ThreePointArc((-14.986, 9.398), (-14.725617928, 10.026617928), (-14.097, 10.287))
        make_face()
        with Locations(Location((0, 0, 0), (0, 0, 180))):
            Circle(SKETCH1_R, mode=Mode.SUBTRACT)
    extrude(amount=BOSS_EXTRUDE1_DEPTH)


solid = part.part
